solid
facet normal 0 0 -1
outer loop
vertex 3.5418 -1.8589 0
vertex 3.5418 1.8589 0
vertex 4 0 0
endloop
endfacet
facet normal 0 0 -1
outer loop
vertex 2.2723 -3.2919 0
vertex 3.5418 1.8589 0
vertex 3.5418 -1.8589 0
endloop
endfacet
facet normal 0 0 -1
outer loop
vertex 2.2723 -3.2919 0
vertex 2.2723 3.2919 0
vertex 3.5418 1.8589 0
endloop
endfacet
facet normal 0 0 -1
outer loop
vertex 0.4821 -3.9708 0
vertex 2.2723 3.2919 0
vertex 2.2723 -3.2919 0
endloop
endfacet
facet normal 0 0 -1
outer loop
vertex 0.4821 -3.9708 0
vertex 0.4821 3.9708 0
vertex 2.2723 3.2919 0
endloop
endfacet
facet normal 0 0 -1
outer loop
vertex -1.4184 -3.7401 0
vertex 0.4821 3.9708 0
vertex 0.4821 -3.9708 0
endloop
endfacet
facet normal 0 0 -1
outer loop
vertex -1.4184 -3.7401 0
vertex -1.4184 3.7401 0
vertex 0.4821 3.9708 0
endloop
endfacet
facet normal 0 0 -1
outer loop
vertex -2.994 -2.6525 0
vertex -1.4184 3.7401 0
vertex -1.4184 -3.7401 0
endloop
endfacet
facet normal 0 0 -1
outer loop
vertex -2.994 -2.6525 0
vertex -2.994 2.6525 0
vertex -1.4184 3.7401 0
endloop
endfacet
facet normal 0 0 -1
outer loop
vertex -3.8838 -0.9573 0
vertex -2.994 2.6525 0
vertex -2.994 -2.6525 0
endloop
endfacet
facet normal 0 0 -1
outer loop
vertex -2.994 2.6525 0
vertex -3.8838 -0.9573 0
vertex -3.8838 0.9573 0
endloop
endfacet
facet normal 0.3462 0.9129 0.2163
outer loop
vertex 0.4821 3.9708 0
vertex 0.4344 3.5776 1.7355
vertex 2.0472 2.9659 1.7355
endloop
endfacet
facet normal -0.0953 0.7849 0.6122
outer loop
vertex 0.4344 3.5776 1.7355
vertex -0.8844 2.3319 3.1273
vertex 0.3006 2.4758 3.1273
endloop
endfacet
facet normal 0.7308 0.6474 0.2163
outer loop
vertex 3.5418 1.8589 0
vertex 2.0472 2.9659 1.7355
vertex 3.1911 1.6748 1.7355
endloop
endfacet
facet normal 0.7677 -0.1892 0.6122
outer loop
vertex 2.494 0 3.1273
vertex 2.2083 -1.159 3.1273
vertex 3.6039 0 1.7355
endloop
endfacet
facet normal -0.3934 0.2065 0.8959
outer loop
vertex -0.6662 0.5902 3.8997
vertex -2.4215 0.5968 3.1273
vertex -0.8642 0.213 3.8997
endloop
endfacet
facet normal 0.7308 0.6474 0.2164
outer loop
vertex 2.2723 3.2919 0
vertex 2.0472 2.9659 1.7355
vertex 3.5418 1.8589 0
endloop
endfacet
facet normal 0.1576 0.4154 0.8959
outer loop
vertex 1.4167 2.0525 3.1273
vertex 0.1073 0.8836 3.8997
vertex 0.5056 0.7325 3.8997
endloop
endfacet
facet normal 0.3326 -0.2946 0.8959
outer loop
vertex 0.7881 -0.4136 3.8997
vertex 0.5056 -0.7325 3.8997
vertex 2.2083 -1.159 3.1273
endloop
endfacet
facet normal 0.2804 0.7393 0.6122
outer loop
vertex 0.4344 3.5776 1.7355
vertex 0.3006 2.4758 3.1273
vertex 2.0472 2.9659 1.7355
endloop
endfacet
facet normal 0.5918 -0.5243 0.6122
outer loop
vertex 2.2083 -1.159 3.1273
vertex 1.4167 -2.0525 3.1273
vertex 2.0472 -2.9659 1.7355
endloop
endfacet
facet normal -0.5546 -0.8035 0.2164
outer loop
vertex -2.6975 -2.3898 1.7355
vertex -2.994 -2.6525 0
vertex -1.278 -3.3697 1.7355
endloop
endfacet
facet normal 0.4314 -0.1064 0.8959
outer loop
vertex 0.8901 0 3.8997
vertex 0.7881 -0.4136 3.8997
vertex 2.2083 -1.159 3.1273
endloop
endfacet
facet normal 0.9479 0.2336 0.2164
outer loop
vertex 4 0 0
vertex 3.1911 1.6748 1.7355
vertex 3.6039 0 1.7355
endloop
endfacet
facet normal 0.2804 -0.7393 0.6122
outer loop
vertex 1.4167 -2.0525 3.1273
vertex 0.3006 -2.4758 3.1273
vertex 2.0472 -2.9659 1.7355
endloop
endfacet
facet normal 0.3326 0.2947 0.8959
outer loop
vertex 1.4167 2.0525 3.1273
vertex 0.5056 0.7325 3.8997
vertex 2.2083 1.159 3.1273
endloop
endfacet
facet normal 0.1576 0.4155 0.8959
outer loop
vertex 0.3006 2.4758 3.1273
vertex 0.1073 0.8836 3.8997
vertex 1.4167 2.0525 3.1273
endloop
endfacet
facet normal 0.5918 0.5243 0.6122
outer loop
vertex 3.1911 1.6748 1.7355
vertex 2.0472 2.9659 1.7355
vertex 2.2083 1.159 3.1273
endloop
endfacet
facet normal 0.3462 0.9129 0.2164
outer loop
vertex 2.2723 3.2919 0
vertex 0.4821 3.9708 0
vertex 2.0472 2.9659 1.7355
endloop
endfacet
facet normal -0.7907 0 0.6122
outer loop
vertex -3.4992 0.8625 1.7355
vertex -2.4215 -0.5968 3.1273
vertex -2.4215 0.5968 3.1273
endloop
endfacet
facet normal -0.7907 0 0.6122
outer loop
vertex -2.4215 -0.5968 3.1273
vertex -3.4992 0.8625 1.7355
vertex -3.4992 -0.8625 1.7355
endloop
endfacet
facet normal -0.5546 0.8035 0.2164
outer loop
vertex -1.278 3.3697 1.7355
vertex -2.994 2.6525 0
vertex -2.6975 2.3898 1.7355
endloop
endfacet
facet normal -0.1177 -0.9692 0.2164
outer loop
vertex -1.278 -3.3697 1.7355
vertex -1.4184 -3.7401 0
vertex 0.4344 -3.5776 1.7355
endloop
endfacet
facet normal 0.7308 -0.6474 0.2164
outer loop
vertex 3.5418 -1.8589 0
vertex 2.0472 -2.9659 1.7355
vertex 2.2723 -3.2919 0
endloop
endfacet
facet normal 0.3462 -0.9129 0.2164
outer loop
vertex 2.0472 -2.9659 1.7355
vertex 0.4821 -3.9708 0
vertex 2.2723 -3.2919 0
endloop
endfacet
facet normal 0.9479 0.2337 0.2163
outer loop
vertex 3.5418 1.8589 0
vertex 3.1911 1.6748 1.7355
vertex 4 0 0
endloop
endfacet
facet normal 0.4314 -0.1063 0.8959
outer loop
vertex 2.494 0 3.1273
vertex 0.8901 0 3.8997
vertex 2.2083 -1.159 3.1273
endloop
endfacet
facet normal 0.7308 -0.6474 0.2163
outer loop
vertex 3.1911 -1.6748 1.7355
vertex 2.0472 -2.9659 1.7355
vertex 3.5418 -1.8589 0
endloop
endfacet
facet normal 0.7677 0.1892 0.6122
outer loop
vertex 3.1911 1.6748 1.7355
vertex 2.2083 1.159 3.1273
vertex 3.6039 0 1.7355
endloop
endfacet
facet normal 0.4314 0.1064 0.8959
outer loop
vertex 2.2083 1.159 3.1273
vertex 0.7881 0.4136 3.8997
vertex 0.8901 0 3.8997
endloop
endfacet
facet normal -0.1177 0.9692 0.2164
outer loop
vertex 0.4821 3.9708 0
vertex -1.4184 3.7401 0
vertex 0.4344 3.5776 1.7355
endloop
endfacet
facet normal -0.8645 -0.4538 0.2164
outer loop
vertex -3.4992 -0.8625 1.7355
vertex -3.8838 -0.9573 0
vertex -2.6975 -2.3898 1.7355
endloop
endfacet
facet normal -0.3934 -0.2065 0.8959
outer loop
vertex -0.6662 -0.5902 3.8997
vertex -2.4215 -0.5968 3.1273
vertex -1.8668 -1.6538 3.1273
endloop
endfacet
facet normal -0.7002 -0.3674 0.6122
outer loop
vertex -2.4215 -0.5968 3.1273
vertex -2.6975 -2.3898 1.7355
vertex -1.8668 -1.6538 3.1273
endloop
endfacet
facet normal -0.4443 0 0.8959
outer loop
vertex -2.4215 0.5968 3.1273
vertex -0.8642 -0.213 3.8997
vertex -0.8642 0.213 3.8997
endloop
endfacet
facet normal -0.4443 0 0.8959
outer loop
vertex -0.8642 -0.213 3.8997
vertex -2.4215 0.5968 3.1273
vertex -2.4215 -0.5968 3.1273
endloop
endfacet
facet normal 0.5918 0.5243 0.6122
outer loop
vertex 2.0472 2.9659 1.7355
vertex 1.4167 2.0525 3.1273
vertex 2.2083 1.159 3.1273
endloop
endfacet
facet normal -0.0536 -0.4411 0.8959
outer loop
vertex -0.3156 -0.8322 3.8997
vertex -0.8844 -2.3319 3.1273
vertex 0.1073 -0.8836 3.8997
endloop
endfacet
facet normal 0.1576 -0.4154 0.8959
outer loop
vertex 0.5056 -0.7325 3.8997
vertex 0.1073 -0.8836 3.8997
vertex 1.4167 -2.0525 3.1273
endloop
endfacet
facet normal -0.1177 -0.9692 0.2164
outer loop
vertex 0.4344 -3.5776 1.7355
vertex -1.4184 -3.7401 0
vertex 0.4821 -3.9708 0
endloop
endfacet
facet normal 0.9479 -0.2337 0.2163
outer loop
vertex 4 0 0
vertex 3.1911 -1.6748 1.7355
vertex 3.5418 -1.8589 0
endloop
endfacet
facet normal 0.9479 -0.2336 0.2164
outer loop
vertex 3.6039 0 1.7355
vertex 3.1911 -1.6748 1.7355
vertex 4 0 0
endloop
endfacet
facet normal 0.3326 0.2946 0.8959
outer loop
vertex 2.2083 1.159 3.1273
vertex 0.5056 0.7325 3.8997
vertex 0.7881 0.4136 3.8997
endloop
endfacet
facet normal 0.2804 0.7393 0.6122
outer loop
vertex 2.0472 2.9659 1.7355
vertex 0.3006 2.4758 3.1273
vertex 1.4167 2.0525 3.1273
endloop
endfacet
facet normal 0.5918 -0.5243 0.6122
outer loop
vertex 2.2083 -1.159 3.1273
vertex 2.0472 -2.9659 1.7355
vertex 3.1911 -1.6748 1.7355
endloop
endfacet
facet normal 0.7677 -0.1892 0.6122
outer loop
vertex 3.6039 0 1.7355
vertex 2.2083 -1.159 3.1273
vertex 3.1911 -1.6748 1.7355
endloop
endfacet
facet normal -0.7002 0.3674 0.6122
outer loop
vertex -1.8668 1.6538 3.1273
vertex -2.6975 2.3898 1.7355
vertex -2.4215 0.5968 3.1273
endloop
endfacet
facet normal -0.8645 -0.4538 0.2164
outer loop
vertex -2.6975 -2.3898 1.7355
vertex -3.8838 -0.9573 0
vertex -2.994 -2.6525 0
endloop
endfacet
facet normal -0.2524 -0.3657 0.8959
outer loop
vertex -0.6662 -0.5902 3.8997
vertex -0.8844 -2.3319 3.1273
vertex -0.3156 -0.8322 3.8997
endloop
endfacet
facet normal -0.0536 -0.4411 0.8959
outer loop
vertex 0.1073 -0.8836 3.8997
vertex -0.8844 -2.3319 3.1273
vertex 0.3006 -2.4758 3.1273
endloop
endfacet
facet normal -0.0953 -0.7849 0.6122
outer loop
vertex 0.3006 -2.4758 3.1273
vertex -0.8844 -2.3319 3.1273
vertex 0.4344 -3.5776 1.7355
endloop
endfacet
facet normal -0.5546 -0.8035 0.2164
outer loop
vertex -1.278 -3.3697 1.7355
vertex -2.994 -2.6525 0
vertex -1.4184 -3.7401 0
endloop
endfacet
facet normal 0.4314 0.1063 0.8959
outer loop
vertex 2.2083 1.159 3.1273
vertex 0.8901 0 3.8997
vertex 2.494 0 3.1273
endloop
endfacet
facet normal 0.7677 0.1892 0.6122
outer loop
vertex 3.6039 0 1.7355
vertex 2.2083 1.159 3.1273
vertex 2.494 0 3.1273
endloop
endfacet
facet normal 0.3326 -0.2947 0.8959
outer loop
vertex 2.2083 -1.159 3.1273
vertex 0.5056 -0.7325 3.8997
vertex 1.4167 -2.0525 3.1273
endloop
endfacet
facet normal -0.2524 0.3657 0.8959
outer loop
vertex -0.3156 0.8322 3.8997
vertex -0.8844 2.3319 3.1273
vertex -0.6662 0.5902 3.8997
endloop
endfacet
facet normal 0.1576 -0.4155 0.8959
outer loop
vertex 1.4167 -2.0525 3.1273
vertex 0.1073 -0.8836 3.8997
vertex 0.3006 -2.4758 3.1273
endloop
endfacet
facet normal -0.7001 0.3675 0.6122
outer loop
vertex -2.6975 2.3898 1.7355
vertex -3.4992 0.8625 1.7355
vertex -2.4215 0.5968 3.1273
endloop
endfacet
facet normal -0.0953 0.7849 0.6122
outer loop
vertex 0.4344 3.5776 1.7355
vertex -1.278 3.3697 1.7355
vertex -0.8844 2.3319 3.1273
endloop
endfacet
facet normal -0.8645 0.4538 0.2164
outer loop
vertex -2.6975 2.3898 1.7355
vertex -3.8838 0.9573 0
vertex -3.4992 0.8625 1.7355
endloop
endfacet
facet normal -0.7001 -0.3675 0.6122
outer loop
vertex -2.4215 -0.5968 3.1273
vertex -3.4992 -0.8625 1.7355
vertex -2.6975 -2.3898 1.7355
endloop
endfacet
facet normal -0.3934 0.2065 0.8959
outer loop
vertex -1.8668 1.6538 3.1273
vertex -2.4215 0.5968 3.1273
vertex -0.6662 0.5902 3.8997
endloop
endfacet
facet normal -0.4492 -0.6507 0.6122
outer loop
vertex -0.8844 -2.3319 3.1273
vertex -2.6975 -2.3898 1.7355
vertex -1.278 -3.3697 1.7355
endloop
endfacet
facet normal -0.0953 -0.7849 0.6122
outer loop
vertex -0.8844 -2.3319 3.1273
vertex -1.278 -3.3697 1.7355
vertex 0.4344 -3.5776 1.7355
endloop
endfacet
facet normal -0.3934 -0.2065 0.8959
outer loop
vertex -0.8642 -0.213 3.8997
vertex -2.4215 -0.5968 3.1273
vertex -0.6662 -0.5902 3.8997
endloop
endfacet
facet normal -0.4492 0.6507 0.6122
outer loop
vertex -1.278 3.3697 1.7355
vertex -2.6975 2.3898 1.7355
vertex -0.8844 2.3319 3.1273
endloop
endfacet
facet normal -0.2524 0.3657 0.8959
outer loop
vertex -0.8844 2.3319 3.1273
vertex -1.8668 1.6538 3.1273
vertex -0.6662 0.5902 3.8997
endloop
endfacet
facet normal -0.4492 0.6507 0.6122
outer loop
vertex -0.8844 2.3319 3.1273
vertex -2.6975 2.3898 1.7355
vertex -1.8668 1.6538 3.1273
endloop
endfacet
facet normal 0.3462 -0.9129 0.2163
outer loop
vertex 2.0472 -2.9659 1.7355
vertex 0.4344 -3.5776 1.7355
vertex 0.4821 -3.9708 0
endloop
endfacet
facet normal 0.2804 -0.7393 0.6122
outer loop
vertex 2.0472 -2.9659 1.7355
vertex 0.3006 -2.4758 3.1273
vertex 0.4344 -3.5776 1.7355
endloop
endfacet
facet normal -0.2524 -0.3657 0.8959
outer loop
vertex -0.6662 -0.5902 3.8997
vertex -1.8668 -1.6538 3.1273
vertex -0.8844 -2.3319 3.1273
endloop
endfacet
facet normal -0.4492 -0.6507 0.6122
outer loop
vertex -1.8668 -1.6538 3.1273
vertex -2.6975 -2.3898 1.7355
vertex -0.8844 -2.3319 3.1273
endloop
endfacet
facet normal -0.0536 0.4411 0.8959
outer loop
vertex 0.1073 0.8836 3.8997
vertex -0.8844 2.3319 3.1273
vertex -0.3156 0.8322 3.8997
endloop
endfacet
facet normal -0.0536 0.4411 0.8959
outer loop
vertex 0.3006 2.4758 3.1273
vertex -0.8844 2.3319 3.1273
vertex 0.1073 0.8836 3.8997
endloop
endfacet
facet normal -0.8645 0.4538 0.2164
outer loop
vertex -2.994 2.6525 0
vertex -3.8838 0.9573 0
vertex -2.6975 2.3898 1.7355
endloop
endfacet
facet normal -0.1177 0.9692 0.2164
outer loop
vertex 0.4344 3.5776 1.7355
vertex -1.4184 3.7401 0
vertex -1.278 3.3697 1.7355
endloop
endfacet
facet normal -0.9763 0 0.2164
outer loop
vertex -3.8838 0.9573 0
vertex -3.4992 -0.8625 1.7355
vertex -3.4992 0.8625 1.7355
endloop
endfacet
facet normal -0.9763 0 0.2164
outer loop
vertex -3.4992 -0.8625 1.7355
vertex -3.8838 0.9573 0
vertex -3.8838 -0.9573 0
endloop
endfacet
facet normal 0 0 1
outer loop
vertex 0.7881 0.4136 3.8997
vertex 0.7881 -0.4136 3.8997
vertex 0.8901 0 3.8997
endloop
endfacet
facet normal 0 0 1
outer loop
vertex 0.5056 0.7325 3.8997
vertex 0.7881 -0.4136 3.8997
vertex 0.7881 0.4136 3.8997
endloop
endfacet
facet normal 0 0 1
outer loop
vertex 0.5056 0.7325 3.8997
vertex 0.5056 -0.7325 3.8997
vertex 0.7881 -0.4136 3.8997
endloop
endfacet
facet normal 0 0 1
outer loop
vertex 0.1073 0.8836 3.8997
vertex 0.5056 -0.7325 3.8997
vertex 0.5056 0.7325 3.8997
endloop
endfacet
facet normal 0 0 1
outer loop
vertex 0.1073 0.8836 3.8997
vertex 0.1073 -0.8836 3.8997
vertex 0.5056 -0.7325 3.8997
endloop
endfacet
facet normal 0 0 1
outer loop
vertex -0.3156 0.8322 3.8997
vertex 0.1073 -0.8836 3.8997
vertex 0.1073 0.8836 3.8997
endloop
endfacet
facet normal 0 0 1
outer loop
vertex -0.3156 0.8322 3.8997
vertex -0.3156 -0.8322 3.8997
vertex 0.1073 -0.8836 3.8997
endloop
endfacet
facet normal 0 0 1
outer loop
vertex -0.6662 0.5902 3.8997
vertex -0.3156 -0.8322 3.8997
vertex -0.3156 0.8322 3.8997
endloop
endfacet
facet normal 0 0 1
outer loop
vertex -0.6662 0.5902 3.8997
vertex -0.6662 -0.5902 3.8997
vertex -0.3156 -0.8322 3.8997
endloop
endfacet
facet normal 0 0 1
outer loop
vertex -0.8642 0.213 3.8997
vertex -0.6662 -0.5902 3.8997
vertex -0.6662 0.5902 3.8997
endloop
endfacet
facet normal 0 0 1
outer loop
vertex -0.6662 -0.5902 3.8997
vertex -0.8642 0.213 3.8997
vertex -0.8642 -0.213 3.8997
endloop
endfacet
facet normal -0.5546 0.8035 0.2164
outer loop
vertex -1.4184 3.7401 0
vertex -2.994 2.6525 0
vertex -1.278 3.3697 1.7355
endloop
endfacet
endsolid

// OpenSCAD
// Generated by generate_scads.py
intersection() {
  sphere(r=4);
  union() {
    cylinder(h=20, r=2, center=true);
    cylinder(h=20, r=4, center=true);
  }
  union() {
    cylinder(h=5, r=2, center=false);
    cylinder(h=15, r=12, center=false);
  }
}
